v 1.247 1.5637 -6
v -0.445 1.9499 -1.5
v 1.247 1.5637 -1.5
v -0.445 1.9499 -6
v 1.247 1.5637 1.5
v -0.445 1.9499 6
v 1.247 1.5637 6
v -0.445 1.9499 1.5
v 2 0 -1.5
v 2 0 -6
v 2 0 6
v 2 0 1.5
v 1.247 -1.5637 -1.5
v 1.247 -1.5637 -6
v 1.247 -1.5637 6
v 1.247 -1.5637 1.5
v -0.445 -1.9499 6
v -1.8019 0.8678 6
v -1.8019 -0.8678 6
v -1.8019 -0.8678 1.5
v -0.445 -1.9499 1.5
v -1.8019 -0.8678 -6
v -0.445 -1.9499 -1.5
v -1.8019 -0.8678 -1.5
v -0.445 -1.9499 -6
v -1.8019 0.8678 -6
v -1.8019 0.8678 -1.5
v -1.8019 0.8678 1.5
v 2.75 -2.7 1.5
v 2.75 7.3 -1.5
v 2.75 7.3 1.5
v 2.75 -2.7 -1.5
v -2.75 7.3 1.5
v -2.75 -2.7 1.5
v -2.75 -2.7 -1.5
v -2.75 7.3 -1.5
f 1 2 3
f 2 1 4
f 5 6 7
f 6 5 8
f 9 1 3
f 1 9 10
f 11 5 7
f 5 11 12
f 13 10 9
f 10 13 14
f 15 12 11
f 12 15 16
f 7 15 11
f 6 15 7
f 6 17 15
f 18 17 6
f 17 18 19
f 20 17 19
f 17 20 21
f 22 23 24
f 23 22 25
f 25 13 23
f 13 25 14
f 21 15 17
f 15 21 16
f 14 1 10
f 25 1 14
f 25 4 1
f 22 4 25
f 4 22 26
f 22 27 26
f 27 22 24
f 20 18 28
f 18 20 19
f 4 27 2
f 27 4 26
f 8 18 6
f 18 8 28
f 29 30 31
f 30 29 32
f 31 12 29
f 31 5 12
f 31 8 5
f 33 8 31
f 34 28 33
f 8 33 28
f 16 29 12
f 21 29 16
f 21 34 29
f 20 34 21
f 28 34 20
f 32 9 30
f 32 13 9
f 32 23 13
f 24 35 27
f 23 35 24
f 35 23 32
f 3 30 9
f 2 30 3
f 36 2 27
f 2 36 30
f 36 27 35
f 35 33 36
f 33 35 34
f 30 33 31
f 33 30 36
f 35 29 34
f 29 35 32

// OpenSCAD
module slotNutTrap(holeOffset, holeDiam, holeDepth, slotWidth, slotDepth, slotThickness) {
    translate([0, 0, - holeDepth / 2]){
        cylinder(h = holeDepth, d =holeDiam);
    }
    translate([-slotWidth / 2, - holeOffset, - slotThickness / 2]){
        cube([slotWidth, slotDepth, slotThickness]);
    }
}

slotNutTrap(2.7, 4, 12, 5.5, 10, 3);
